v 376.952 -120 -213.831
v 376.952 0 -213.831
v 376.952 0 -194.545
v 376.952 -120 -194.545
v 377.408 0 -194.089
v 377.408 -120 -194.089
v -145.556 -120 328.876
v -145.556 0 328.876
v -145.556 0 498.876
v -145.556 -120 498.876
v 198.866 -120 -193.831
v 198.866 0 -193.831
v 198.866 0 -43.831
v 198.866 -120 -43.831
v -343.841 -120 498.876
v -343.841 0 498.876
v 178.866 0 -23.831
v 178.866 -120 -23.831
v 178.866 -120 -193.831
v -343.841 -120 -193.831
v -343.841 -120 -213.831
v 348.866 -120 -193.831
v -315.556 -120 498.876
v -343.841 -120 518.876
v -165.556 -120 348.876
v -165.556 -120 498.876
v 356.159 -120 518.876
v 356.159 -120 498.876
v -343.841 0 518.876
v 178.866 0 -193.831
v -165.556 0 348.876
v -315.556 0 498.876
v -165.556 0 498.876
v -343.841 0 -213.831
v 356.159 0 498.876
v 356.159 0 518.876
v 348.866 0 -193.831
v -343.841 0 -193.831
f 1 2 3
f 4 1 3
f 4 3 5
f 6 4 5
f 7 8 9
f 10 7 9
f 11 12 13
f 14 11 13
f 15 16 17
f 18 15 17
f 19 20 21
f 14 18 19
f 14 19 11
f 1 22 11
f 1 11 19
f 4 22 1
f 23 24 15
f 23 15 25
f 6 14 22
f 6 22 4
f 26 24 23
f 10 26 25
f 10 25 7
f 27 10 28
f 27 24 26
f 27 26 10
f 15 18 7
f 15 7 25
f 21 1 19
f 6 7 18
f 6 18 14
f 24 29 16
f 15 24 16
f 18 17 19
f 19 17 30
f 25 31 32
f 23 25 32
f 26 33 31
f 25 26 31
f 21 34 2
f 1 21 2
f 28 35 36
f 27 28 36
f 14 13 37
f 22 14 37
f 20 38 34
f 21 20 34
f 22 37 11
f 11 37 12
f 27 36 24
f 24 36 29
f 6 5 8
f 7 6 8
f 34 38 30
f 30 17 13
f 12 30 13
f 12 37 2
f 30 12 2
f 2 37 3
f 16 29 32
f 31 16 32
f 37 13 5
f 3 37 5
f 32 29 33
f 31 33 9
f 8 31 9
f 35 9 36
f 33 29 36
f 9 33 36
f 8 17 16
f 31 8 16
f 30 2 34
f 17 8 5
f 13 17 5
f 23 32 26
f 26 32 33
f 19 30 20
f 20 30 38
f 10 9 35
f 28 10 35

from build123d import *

# Parameters (mm, degrees)
F1_DEPTH = 120


with BuildPart() as f1:
    # F0 (on Front) → F1 (new body)
    with BuildSketch(Plane.XZ):
        Polygon((356.159233, 498.875577), (356.159233, 518.875577), (-343.840767, 518.875577), (-343.840767, 498.875577), (-315.556496, 498.875577), (-165.556496, 498.875577), (-145.556496, 498.875577), align=None)
        Polygon((-315.556496, 498.875577), (-343.840767, 498.875577), (178.866161, -23.83135), (198.866161, -43.83135), (348.866161, -193.83135), (376.951969, -193.83135), (376.951969, -194.545249), (377.40815, -194.089068), (-145.556496, 328.875577), (-165.556496, 348.875577), align=None)
        Polygon((-145.556496, 328.875577), (-145.556496, 498.875577), (-165.556496, 498.875577), (-165.556496, 348.875577), align=None)
        Polygon((198.866161, -43.83135), (178.866161, -23.83135), (178.866161, -193.83135), (198.866161, -193.83135), align=None)
        Polygon((198.866161, -193.83135), (178.866161, -193.83135), (-343.840767, -193.83135), (-343.840767, -213.83135), (376.951969, -213.83135), (376.951969, -194.545249), (376.951969, -193.83135), (348.866161, -193.83135), align=None)
    extrude(amount=F1_DEPTH)


solid = f1.part
